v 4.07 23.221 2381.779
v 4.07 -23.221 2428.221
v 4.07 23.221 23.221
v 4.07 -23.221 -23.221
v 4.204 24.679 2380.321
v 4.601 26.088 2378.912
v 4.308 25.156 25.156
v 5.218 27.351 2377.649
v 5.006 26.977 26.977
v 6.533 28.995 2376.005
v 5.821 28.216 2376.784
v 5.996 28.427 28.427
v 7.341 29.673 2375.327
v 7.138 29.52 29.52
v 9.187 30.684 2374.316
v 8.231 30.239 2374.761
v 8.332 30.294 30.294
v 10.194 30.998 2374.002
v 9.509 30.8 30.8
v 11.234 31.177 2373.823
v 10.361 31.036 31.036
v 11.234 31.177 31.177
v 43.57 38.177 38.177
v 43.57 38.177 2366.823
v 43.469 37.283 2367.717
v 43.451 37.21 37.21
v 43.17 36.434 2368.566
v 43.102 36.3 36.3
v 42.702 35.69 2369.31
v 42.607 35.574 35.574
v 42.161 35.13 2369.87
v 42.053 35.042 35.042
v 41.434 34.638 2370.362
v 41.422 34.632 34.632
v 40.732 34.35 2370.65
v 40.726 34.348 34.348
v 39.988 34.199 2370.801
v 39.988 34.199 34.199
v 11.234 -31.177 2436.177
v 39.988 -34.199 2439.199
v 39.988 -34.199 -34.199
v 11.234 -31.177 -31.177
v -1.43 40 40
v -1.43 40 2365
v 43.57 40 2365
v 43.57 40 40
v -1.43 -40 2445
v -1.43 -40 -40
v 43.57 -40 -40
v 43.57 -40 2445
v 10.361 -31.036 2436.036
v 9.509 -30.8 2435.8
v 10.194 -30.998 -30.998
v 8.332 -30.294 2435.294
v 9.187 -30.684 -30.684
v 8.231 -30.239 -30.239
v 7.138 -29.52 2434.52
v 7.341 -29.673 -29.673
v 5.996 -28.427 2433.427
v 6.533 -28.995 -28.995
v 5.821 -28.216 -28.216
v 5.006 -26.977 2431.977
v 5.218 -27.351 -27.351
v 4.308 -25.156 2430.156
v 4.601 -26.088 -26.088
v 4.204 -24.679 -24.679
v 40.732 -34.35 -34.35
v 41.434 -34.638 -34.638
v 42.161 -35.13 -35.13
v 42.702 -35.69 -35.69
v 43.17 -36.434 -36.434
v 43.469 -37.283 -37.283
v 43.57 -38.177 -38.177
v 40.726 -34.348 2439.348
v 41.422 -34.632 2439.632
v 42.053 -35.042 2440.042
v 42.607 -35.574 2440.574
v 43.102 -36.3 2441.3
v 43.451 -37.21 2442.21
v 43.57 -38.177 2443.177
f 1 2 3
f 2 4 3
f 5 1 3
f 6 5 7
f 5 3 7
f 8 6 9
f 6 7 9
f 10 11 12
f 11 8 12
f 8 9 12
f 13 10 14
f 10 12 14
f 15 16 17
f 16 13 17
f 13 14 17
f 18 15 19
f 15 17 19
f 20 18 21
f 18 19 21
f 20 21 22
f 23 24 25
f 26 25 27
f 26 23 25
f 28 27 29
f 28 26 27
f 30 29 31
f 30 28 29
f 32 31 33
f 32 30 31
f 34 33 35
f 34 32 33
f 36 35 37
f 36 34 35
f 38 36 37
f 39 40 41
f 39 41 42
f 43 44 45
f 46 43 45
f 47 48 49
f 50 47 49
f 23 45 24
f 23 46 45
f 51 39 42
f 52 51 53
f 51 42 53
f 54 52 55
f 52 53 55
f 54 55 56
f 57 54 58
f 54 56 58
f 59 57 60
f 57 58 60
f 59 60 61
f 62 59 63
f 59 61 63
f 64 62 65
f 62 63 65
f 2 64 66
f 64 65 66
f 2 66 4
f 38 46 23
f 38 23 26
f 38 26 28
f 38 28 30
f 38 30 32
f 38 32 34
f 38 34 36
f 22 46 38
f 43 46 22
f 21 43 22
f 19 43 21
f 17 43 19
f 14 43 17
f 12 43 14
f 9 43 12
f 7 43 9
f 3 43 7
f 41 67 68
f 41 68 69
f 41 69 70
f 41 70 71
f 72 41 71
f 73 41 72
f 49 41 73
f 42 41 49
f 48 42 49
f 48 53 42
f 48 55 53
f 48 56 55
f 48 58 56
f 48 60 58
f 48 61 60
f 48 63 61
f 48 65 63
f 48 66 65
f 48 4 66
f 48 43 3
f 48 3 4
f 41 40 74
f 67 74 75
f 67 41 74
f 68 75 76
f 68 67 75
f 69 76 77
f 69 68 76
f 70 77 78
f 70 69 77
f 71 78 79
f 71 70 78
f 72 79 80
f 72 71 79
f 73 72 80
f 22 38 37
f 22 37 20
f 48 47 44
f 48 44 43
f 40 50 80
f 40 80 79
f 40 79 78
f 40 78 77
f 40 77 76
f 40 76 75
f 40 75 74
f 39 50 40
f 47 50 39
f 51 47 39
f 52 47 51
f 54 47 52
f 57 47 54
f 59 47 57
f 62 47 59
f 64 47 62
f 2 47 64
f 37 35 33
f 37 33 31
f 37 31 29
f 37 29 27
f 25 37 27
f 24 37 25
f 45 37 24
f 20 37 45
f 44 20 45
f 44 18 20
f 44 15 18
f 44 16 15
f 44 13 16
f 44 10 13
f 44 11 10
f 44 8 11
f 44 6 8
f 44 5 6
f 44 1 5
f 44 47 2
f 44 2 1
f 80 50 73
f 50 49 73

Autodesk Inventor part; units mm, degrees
ref_plane "Начальная плоскость" through (0, 0, -40) normal (0, 0, 1) x (1, 0, 0)
ref_plane "Конечная плоскость" through (0, 0, 2445) normal (0, 0, 1) x (1, 0, 0)
sketch "Эскиз" plane through (0, 0, 0) normal (0, 0, 1) x (1, 0, 0)
  line L0 (-1.43, 0) -> (-1.43, 40)
  line L1 (-1.43, 40) -> (43.57, 40)
  line L2 (43.57, 40) -> (43.57, 38.1774)
  line L3 (39.9881, 34.1993) -> (11.2338, 31.1771)
  line L4 (4.07, 23.221) -> (4.07, 0)
  line L5 (4.07, 0) -> (-1.43, 0) construction
  line L6 (23.82, 40) -> (23.82, 32.5) construction
  line L7 (43.57, 34.5758) -> (43.57, 32.5) construction
  line L8 (43.57, 32.5) -> (23.82, 32.5) construction
  line L9 (0, 15) -> (0, -27) construction
  line L10 (-5.539, 0) -> (16.0067, 0) construction
  line L11 (-1.43, 0) -> (-1.43, -40)
  line L12 (-1.43, -40) -> (43.57, -40)
  line L13 (43.57, -40) -> (43.57, -38.1774)
  line L14 (39.9881, -34.1993) -> (11.2338, -31.1771)
  line L15 (4.07, -23.221) -> (4.07, 0)
  arc A0 (11.2338, 31.1771) -> (4.07, 23.221) centre (12.07, 23.221) ccw
  arc A1 (4.07, -23.221) -> (11.2338, -31.1771) centre (12.07, -23.221) ccw
  arc A2 (39.9881, 34.1993) -> (43.57, 38.1774) centre (39.57, 38.1774) ccw
  arc A3 (43.57, -38.1774) -> (39.9881, -34.1993) centre (39.57, -38.1774) ccw
  line L16 (0, 56) -> (0, -56) construction
  line L17 (-15.5135, 0) -> (54.308, 0) construction
  point P0 (4.07, 30.4242)
  point P1 (43.57, -34.5758)
  point P2 (4.07, -30.4242)
  point P3 (23.82, -40)
  point P4 (23.82, -32.5)
  dimension "d0" = 5.5
  dimension "d1" = 40
  dimension "d2" = 45
  dimension "d3" = 7.5
  dimension "d4" = 19.75
  dimension "d5" = 2.0758
  dimension "d23" = 8
  dimension "d24" = 4
  dimension "d25" = 1.43
extrude "Тело" add sketch "Эскиз" along normal up to surface (2485 mm away) from surface at -40
sketch "Sketch3" plane through (0, 0, 0) normal (0, 0, 1) x (1, 0, 0)
  line L0 (0, 0) -> (10, 0)
ref_plane "Work Plane3" through (0, 0, 0) normal (0, -1, 0) x (1, 0, 0)
sketch "Sketch4" plane through (0, 0, 0) normal (0, -1, 0) x (1, 0, 0)
  line L0 (-2, -40) -> (12, -40)
  line L1 (-2, 2445) -> (12, 2445)
  dimension "d29" = 2485
ref_plane "РабПлоскость4" through (21.07, -40, -40) normal (0, 0.7071, -0.7071) x (1, 0, 0)
split "Разделение1" plane through (21.07, -40, -40) removes the side toward (0, 0.7071, -0.7071)
ref_plane "РабПлоскость5" through (21.07, -40, 2445) normal (0, 0.7071, 0.7071) x (1, 0, 0)
split "Разделение2" plane through (21.07, -40, 2445) removes the side toward (0, 0.7071, 0.7071)
equation "\"d0\" = G_T"
equation "\"d1\" = 0.5 * G_H"
equation "\"d2\" = G_W"
equation "\"d3\" = G_T1"
equation "\"d4\" = G_C"
equation "\"d23\" = G_IR"
equation "\"d24\" = G_ER"
equation "\"d25\" = ex"
equation "\"d6\" = G_L"
equation "\"G_W\" = 45"
equation "\"G_T\" = 5.5"
equation "\"G_T1\" = 7.5"
equation "\"G_NG\" = 0.105104"
equation "\"G_ER\" = 4"
equation "\"G_IR\" = 8"
equation "\"G_C\" = 19.75"
equation "\"G_L\" = d29"
equation "\"ex\" = 1.43"
equation "\"d27\" = G_OFFSET_END + B_L"
equation "\"B_L\" = 2405"
equation "\"G_H\" = 80"
equation "\"G_OFFSET_END\" = 40"
properties part number "ISO 657/11 - CH 80 x 8 - 2485" material "Сталь, мягкая"
